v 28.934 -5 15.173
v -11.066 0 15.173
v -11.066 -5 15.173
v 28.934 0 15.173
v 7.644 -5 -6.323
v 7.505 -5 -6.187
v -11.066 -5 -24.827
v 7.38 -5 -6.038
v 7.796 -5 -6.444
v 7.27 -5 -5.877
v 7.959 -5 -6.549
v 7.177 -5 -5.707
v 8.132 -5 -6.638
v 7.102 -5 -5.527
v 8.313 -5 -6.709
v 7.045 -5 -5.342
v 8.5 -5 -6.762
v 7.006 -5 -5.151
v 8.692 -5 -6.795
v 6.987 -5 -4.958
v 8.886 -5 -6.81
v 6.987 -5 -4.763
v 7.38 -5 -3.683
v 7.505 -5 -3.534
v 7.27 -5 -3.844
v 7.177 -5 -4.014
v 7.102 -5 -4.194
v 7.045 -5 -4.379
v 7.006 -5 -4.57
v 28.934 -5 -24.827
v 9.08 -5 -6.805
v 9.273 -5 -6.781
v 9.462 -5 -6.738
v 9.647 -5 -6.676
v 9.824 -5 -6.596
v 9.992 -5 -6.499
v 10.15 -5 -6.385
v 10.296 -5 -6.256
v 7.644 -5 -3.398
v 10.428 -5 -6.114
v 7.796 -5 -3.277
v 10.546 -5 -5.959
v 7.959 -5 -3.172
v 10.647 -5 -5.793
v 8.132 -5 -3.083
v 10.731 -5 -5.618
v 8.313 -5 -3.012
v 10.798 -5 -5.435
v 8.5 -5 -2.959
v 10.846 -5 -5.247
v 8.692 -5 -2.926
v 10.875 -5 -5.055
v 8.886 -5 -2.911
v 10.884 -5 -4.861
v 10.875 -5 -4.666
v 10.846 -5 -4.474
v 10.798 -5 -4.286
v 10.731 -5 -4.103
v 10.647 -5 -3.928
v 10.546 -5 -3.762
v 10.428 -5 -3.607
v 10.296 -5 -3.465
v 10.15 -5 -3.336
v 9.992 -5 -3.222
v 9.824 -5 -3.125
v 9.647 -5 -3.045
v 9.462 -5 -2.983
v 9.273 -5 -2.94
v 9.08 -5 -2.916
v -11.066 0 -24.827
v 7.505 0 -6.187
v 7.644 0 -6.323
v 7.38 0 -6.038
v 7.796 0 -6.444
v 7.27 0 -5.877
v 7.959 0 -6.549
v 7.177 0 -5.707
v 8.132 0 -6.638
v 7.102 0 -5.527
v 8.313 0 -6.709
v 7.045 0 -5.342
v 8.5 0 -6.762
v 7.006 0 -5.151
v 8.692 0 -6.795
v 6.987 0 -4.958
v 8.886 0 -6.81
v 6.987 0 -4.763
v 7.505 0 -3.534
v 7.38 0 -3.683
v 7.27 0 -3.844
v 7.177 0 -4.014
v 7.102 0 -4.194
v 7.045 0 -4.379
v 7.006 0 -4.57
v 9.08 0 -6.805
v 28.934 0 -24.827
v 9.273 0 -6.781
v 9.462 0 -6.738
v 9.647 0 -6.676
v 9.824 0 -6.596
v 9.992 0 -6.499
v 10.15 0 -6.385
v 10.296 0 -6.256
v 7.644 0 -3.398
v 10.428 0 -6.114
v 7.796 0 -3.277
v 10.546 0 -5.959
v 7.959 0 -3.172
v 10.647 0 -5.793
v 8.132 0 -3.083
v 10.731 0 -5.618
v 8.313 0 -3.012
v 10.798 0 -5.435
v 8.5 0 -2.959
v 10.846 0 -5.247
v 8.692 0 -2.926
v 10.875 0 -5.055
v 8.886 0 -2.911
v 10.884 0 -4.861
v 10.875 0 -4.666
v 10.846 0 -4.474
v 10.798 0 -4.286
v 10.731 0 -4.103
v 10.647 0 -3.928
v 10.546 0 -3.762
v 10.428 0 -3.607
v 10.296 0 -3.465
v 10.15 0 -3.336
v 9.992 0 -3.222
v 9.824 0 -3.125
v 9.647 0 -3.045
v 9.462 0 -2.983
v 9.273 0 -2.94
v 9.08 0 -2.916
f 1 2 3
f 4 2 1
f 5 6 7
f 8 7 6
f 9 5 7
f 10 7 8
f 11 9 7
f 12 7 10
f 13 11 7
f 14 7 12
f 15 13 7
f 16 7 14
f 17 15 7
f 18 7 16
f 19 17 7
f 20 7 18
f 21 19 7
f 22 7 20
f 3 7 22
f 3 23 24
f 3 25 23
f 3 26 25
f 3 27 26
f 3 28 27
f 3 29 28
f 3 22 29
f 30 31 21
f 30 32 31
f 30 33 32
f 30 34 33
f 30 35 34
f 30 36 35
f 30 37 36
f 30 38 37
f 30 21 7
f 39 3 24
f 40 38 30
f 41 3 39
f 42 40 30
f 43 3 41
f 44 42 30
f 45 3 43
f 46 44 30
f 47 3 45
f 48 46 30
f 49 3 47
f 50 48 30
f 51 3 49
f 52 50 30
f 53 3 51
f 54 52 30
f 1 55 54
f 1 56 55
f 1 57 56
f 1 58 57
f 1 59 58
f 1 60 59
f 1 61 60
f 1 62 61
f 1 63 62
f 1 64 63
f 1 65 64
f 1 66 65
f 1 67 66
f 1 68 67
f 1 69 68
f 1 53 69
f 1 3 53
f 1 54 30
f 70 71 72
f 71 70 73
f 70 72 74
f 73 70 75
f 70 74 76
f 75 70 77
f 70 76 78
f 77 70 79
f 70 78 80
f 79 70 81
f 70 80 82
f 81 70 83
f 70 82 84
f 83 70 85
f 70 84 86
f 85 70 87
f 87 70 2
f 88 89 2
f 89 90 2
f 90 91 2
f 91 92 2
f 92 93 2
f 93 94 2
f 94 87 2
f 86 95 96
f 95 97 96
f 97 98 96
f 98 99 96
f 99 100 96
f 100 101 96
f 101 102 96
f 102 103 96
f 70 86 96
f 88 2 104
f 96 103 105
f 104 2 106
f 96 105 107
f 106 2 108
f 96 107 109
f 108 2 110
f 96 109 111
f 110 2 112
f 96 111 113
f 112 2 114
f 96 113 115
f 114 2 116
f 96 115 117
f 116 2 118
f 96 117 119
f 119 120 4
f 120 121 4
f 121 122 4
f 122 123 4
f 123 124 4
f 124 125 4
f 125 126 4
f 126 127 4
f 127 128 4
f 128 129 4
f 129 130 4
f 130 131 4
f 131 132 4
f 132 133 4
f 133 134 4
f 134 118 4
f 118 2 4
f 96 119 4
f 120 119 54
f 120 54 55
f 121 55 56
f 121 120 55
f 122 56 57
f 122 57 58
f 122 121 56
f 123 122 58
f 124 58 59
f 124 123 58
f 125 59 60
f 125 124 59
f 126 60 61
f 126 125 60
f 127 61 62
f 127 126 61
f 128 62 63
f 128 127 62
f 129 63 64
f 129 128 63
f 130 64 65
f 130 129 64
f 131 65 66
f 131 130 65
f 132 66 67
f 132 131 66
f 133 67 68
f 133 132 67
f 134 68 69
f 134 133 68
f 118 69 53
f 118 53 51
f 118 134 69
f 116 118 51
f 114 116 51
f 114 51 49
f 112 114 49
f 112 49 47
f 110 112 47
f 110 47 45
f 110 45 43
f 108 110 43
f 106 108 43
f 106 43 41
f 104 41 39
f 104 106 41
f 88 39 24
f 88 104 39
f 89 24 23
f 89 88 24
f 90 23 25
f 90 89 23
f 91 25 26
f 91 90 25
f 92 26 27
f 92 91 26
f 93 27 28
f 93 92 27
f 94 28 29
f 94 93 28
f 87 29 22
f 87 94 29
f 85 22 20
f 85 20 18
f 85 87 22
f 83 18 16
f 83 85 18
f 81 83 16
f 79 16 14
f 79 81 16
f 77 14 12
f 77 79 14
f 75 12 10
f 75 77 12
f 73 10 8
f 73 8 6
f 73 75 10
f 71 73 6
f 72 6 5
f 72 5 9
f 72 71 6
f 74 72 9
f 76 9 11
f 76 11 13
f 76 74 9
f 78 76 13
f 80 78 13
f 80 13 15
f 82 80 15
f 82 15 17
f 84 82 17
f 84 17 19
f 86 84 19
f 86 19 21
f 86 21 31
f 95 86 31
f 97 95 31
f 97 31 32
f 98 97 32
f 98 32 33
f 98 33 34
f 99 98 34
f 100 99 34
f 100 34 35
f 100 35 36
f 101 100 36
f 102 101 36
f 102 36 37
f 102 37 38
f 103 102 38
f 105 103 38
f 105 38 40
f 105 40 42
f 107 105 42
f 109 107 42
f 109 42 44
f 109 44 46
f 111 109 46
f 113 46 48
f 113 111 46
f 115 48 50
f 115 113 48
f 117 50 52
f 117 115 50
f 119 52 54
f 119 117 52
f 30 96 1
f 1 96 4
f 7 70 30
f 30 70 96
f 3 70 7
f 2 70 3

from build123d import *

# Parameters (mm, degrees)
SKETCH_AS_DRAWN_W              = 40
SKETCH_AS_DRAWN_H              = 40
SKETCH_AS_DRAWN_R              = 1.95
EXTRUDE_DEPTH                  = 5
EXTRUDE_ONTO_SKETCH_ROLL_ANGLE = 90


with BuildPart() as part:
    # Sketch as drawn → Extrude (new)
    with BuildSketch(Plane.XY):
        with Locations((8.934355, -4.827021)):
            Rectangle(SKETCH_AS_DRAWN_W, SKETCH_AS_DRAWN_H)
        with Locations((8.934355, -4.860531)):
            Circle(SKETCH_AS_DRAWN_R, mode=Mode.SUBTRACT)
    extrude(amount=EXTRUDE_DEPTH)


with BuildPart() as part_1:
    # Extrude onto Sketch roll: moved
    add(part.part.rotate(Axis((0, 0, 0), (1, 0, 0)), EXTRUDE_ONTO_SKETCH_ROLL_ANGLE))


with BuildPart() as part_2:
    # Extrude onto Sketch placement: moved
    add(part_1.part)


solid = part_2.part
